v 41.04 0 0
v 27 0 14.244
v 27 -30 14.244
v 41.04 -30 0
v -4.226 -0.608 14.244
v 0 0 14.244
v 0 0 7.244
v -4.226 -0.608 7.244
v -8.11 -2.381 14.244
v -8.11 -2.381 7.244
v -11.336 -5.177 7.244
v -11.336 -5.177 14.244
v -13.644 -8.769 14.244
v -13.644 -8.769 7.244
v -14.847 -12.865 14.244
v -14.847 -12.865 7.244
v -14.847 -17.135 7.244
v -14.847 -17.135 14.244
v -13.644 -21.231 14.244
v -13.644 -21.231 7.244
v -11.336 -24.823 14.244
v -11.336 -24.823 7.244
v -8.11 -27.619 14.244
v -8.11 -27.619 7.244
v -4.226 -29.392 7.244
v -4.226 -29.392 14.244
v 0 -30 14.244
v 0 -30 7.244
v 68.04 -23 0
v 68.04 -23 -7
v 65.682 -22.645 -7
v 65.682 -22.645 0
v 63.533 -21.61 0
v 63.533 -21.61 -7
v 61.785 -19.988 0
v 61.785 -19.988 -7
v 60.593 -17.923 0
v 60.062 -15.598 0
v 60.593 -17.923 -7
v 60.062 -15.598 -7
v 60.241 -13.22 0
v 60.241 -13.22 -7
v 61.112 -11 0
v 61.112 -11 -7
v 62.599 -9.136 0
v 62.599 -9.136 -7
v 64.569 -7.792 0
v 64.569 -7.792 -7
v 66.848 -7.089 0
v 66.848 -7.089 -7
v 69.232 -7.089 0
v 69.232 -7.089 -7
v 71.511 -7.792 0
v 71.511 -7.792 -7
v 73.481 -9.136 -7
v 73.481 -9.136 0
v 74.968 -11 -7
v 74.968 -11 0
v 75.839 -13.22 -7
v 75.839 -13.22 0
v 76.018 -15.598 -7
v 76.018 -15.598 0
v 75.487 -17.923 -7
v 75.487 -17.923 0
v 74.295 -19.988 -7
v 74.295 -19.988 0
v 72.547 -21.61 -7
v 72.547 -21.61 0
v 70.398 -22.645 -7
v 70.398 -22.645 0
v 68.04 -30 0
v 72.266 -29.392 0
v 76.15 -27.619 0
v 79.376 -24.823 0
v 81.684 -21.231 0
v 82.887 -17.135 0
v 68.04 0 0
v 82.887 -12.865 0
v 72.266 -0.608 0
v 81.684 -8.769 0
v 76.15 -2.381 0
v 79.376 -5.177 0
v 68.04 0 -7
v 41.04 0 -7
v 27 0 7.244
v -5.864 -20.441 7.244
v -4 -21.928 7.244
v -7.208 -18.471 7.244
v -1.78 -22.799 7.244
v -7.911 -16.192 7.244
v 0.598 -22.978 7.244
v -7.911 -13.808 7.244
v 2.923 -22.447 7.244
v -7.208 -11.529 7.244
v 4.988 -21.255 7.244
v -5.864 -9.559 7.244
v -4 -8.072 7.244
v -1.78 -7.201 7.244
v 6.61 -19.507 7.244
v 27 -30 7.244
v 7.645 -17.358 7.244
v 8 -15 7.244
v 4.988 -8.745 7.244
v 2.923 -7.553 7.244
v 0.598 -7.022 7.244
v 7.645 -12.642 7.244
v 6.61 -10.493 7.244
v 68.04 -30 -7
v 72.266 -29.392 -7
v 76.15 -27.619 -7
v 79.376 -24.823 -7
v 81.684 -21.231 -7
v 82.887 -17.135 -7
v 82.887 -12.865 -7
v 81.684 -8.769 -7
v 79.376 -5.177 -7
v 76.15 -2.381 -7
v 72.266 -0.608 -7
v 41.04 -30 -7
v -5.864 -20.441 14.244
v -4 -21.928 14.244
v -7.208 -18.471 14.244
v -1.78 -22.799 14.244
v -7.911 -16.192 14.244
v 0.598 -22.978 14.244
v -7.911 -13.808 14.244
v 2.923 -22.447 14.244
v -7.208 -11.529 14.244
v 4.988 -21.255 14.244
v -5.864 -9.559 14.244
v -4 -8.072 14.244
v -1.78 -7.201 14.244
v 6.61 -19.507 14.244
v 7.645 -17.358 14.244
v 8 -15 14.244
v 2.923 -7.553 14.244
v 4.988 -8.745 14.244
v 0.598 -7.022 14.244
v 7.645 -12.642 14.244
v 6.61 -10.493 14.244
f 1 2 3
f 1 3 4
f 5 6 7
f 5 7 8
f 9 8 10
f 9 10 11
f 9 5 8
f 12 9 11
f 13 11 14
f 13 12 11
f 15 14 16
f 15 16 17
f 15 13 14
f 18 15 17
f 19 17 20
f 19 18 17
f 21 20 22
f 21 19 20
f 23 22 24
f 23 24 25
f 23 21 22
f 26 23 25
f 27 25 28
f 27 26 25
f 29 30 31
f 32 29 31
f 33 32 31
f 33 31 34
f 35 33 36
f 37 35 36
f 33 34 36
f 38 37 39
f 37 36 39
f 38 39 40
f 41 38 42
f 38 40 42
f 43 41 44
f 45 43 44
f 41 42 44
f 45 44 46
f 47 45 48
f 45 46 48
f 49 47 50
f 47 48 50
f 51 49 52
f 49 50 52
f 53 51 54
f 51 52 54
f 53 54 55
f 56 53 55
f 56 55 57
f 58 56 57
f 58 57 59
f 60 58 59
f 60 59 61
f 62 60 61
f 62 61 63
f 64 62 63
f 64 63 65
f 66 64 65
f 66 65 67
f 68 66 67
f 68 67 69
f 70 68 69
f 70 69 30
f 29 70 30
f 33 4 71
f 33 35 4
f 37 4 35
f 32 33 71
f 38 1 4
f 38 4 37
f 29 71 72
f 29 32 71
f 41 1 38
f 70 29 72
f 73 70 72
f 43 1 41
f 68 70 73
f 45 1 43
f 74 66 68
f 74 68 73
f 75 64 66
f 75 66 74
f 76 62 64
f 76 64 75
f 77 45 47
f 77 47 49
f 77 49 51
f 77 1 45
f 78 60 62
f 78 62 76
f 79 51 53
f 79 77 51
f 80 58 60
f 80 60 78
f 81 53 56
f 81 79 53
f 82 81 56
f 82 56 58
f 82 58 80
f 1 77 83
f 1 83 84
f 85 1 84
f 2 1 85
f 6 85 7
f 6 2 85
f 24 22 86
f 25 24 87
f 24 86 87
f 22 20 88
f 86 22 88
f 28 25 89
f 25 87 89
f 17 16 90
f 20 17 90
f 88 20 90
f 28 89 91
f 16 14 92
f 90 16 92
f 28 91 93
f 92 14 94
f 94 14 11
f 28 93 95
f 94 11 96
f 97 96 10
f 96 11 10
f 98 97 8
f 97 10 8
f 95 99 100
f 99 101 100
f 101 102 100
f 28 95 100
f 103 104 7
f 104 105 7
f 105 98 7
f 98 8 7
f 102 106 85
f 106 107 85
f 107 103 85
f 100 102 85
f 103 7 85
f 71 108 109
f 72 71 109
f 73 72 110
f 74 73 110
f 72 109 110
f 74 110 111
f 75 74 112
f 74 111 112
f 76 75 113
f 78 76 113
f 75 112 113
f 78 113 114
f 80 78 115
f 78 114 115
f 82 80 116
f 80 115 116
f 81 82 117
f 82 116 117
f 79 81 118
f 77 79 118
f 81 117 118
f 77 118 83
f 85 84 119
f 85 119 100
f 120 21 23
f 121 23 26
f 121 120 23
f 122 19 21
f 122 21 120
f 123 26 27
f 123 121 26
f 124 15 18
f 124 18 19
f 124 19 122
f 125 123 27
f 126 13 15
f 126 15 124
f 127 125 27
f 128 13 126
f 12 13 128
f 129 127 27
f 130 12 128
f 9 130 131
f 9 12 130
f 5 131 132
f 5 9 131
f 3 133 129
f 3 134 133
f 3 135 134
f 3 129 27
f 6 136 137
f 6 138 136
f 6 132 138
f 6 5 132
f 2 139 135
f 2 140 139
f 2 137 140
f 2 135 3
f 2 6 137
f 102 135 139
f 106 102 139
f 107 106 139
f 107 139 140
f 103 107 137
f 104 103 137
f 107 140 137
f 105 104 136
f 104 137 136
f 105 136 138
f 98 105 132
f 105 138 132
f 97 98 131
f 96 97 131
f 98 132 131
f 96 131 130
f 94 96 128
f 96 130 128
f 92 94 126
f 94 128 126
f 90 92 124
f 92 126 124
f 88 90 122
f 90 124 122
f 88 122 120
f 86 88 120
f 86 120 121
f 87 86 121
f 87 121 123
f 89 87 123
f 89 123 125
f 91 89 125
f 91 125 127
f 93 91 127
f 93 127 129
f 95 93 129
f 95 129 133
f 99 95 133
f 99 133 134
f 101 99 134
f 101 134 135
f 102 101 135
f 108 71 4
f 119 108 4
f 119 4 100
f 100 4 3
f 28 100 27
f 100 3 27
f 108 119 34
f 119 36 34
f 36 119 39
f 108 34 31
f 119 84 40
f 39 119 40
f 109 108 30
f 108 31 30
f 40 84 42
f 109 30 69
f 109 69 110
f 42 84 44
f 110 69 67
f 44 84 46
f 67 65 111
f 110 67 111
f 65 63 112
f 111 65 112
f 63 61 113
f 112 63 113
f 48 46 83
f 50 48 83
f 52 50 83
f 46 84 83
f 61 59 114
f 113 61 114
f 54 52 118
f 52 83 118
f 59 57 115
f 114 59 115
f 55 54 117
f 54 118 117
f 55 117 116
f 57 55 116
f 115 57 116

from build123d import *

# Parameters (mm, degrees)
PAD_DEPTH       = 30
PAD001_DEPTH    = 7
PAD002_DEPTH    = 7
SKETCH004_R     = 8
POCKET_DEPTH    = 21.244539
SKETCH006_R     = 8
POCKET001_DEPTH = 21.244539


with BuildPart() as part:
    # Sketch → Pad (new body)
    with BuildSketch(Plane.XZ):
        Polygon((0, 14.243539), (27, 14.243539), (41.04, 0), (68.04, 0), (68.04, -7), (41.04, -7), (27, 7.243539), (0, 7.243539), align=None)
    extrude(amount=PAD_DEPTH)

    # Sketch002 (on DatumPlane) → Pad001 (join)
    with BuildSketch(Plane(origin=(0, -15, 14.243539), x_dir=(1, 0, 0), z_dir=(0, 0, 1))):
        with BuildLine():
            ThreePointArc((0, 15), (-15, 0), (0, -15))
            Line((0, 15), (0, -15))
        make_face()
    extrude(amount=-PAD001_DEPTH)

    # Sketch003 (on DatumPlane) → Pad002 (join)
    with BuildSketch(Plane(origin=(68.04, -15, -7), x_dir=(1, 0, 0), z_dir=(0, 0, 1))):
        with BuildLine():
            ThreePointArc((0, -15), (14.999969, 0), (0, 15))
            Line((0, 15), (0, -15))
        make_face()
    extrude(amount=PAD002_DEPTH)

    # Sketch004 → Pocket (cut, through all)
    with BuildSketch(Plane(origin=(68.039969, -15, -7), x_dir=(0, -1, 0), z_dir=(0, 0, -1))):
        Circle(SKETCH004_R)
    extrude(amount=-POCKET_DEPTH, mode=Mode.SUBTRACT)

    # Sketch006 (on DatumPlane) → Pocket001 (cut, through all)
    with BuildSketch(Plane(origin=(0, -15, 14.243539), x_dir=(1, 0, 0), z_dir=(0, 0, 1))):
        Circle(SKETCH006_R)
    extrude(amount=-POCKET001_DEPTH, mode=Mode.SUBTRACT)


solid = part.part
